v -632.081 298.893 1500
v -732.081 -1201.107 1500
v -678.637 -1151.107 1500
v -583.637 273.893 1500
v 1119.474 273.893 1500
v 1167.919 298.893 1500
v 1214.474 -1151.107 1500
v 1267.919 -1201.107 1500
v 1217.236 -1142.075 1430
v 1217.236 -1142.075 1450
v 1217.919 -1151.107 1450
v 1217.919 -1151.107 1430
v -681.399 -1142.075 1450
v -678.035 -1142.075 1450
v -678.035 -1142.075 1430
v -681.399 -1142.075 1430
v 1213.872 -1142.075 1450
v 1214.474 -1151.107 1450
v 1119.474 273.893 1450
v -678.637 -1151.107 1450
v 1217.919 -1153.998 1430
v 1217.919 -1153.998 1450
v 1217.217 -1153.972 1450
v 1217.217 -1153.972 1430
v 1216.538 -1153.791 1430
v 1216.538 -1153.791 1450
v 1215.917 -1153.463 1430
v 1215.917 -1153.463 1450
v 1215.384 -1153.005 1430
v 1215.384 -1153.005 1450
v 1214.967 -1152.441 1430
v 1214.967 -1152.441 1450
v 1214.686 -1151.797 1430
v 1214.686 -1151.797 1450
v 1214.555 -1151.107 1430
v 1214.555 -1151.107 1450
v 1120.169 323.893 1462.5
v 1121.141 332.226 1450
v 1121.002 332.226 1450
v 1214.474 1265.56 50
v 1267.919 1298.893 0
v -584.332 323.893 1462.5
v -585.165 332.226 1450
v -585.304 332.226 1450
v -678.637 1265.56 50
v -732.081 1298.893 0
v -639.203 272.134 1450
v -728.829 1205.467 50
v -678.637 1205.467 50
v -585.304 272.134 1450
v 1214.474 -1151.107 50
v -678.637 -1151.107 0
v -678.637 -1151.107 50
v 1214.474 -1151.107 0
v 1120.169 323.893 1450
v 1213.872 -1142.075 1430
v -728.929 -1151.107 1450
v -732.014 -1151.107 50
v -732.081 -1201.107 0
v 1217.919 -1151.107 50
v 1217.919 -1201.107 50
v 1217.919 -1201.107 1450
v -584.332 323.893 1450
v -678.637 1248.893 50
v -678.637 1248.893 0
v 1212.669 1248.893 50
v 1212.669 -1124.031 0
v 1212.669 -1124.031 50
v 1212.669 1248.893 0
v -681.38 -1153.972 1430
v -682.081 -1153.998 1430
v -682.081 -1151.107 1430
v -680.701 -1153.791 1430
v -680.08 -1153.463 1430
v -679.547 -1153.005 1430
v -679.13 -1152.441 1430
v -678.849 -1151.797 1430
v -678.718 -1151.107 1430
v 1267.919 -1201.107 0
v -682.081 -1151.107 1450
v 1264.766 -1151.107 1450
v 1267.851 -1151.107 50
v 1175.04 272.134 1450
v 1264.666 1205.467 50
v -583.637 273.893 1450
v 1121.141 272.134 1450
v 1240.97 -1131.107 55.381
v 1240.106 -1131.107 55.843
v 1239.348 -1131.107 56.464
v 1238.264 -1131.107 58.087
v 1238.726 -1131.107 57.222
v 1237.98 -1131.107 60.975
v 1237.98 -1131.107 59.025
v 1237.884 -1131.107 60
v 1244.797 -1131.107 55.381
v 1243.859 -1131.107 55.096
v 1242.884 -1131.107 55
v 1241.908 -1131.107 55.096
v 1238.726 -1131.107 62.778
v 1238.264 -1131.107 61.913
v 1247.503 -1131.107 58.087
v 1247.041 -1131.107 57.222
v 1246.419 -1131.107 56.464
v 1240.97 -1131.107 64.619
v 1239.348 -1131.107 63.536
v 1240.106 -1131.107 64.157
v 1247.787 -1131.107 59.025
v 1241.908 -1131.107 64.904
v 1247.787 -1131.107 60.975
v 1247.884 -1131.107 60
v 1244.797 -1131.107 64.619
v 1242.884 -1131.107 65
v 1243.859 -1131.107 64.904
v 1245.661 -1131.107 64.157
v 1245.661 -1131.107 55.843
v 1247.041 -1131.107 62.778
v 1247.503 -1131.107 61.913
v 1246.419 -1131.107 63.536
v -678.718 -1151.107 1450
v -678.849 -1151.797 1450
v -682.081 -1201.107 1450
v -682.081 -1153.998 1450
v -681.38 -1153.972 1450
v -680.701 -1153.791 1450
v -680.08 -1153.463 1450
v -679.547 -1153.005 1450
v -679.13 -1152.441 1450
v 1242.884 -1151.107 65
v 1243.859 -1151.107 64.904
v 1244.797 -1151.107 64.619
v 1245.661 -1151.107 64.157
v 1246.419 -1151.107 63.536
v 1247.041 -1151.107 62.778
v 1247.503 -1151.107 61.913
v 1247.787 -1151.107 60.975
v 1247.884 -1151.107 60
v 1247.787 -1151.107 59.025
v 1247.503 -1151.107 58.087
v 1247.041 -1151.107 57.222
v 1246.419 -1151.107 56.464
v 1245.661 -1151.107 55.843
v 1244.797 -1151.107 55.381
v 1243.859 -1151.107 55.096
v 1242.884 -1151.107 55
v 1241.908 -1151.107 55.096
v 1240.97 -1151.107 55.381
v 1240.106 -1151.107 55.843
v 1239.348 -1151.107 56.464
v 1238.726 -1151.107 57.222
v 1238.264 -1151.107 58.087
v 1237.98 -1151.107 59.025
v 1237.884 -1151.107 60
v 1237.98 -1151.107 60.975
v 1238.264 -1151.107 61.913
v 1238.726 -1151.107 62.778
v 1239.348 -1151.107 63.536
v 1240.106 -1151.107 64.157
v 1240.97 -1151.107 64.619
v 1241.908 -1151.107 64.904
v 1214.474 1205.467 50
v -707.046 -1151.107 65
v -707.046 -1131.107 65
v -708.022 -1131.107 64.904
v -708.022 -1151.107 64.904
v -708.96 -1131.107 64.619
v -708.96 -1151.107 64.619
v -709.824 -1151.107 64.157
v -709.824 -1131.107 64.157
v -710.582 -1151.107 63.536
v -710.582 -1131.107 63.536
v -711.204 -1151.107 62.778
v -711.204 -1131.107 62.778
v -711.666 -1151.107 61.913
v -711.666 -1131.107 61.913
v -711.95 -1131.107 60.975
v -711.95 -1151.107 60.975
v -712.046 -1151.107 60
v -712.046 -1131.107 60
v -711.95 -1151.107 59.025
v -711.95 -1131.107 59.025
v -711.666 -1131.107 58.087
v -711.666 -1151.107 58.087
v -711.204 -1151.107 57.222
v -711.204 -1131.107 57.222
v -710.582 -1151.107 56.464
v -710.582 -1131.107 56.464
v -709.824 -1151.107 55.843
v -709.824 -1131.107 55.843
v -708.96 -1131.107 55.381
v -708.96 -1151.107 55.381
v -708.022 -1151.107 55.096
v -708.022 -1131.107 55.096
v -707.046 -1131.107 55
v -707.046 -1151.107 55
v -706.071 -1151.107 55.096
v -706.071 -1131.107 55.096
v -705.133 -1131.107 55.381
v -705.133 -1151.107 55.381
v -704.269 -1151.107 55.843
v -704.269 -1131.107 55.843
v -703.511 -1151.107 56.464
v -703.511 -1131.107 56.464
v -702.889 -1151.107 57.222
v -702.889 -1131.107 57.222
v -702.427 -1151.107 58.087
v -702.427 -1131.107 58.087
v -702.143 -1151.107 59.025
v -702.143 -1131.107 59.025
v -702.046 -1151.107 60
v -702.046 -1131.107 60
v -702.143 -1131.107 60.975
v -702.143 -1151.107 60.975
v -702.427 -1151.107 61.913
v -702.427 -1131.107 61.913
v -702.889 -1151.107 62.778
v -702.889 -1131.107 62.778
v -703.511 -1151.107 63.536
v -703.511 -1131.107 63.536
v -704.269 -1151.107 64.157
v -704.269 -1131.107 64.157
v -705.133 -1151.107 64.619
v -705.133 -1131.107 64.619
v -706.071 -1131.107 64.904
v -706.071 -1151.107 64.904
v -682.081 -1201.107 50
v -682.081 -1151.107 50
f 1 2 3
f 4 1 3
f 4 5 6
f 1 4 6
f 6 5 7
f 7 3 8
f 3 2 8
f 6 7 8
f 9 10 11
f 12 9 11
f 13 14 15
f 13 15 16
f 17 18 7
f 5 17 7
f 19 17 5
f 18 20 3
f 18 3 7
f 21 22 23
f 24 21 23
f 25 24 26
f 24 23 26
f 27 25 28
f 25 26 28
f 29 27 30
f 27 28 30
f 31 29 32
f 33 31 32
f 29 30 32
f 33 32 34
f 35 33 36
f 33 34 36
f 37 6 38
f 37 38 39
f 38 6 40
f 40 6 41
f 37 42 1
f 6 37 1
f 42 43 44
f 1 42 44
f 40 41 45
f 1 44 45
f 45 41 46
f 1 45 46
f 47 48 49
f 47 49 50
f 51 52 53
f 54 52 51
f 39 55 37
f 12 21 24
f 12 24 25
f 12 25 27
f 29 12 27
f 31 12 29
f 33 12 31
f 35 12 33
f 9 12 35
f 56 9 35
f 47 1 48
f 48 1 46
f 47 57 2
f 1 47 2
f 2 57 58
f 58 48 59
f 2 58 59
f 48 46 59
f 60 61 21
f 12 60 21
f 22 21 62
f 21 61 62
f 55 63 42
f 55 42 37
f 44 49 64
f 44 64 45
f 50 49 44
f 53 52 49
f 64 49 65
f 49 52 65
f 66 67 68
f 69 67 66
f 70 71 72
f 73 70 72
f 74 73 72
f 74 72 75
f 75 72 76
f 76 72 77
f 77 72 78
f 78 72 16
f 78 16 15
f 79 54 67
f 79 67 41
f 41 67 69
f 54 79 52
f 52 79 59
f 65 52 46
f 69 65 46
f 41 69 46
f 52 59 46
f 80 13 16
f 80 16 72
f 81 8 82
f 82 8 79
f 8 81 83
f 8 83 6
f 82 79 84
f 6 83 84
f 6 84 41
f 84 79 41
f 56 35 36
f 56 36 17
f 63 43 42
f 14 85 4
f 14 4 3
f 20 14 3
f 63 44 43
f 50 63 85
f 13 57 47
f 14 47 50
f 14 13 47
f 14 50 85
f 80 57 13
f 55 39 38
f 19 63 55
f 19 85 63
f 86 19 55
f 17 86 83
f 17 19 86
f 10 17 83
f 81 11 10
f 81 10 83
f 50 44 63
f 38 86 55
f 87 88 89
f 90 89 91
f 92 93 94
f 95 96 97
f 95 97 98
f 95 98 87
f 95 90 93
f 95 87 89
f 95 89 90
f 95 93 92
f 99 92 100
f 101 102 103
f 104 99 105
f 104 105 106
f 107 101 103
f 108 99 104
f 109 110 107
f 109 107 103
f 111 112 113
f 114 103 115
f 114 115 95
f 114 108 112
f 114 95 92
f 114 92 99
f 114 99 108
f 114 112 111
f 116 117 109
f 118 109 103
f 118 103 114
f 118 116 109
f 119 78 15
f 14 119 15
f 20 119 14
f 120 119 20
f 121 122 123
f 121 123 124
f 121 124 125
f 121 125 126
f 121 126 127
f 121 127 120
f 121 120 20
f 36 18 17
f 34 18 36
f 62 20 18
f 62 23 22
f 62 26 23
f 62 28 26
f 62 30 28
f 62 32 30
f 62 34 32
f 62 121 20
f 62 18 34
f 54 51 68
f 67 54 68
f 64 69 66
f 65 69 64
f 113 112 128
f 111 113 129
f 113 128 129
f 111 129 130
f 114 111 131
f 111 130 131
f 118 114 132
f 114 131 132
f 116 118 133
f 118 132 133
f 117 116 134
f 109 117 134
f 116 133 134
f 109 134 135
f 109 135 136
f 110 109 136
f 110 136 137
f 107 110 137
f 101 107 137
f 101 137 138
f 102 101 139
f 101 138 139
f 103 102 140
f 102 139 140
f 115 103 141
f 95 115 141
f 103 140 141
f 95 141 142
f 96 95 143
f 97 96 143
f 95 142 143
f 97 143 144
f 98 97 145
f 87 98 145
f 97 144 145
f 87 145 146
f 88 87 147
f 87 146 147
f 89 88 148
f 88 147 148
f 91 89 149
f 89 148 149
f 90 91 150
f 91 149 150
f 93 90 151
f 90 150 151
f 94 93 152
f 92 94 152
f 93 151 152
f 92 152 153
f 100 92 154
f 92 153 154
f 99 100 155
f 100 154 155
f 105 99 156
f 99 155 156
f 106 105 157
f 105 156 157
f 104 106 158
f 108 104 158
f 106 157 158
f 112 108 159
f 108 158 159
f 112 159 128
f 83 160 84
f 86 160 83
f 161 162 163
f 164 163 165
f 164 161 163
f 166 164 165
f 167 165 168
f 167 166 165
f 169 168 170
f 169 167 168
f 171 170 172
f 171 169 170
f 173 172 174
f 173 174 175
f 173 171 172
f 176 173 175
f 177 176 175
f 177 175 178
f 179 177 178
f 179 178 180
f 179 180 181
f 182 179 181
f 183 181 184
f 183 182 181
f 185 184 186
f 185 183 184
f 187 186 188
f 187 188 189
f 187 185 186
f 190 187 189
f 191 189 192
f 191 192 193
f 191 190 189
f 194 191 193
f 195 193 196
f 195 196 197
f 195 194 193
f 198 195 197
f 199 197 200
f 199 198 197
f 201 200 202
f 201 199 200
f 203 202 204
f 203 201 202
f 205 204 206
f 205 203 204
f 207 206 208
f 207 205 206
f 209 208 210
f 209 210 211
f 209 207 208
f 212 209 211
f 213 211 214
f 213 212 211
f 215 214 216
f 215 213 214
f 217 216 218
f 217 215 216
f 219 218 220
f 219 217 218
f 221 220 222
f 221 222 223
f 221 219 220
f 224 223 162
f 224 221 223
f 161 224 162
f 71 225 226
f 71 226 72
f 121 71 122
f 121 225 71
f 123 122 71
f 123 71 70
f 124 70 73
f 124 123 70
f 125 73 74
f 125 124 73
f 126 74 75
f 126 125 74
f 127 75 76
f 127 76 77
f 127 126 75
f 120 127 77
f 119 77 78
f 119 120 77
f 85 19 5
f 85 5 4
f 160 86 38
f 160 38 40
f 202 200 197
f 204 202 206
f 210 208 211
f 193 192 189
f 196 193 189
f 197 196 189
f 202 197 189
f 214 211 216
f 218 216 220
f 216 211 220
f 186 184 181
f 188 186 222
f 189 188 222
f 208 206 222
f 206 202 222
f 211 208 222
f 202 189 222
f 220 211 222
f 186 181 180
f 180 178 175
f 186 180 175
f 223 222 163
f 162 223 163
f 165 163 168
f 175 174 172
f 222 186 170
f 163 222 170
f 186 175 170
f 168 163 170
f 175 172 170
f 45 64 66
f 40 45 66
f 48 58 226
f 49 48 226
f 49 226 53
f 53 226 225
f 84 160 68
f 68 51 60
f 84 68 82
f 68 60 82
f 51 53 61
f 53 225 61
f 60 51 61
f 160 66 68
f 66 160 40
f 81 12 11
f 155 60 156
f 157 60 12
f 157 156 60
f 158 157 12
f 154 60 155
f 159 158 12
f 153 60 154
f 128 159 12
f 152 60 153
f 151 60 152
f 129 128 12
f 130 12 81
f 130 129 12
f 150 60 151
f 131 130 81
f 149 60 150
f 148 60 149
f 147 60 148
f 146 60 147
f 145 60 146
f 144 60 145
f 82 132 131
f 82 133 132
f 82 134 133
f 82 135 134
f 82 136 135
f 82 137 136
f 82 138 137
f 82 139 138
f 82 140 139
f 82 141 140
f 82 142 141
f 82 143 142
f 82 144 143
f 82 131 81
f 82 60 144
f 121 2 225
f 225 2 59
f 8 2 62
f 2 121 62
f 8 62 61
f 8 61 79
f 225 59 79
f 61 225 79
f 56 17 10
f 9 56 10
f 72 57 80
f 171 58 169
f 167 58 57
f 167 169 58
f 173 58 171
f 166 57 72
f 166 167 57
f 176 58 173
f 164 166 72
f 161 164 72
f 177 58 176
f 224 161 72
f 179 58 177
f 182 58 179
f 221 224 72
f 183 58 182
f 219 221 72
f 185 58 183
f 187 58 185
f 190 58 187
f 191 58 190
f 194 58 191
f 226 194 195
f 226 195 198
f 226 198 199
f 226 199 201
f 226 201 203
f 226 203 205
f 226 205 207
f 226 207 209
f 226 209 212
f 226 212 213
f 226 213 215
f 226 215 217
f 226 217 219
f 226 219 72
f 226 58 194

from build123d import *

# Parameters (mm, degrees)
ENL_V_MAT_EXTRU_1_DEPTH      = 1873
ENL_V_MAT_EXTRU_1_DEPTH_BACK = 1210
ENL_V_MAT_EXTRU_2_DEPTH      = 2794
ESQUISSE5_W                  = 1891.306300633
ESQUISSE5_H                  = 2400
ENL_V_MAT_EXTRU_3_DEPTH      = 50
ESQUISSE7_W                  = 1900
ESQUISSE7_H                  = 1400
ENL_V_MAT_EXTRU_5_DEPTH      = 50
ENL_V_MAT_EXTRU_6_DEPTH      = 1354
ENL_V_MAT_EXTRU_6_DEPTH_BACK = 877
ESQUISSE10_R                 = 5
BOSS_EXTRU_1_DEPTH           = 20
BOSS_EXTRU_3_DEPTH           = 20


with BuildPart() as part:
    # Esquisse2 → Lissage1 section 0
    with BuildSketch(Plane.XY.offset(1500)):
        with BuildLine():
            Line((-732.081466601, -1201.10701107), (1267.918533399, -1201.10701107))
            Line((1267.918533399, -1201.10701107), (1167.918533399, 298.89298893))
            Line((1167.918533399, 298.89298893), (-632.081466601, 298.89298893))
            Line((-632.081466601, 298.89298893), (-732.081466601, -1201.10701107))
        make_face()
    # Esquisse1 → Lissage1 section 1
    with BuildSketch(Plane.XY):
        with BuildLine():
            Line((-732.081466601, 1298.89298893), (1267.918533399, 1298.89298893))
            Line((1267.918533399, 1298.89298893), (1267.918533399, -1201.10701107))
            Line((1267.918533399, -1201.10701107), (-732.081466601, -1201.10701107))
            Line((-732.081466601, -1201.10701107), (-732.081466601, 1298.89298893))
        make_face()
    loft()

    # Esquisse3 → Enlèv. mat.-Extru.1 (cut, two sides: drawn at the far end of the back side and taken through both)
    with BuildSketch(Plane(origin=(0, 0, 0), x_dir=(0, 0, -1), z_dir=(1, 0, 0)).offset(-ENL_V_MAT_EXTRU_1_DEPTH_BACK)):
        Polygon((-1450, -1151.10701107), (-50, -1151.10701107), (-50, 1205.467134339), (-1450, 272.133801005), align=None)
    extrude(amount=ENL_V_MAT_EXTRU_1_DEPTH + ENL_V_MAT_EXTRU_1_DEPTH_BACK, mode=Mode.SUBTRACT)

    # Esquisse4 → Enlèv. mat.-Extru.2 (cut)
    with BuildSketch(Plane.XY):
        Polygon((-583.637145339, 273.89298893), (-678.637145339, -1151.10701107), (1214.474212138, -1151.10701107), (1119.474212138, 273.89298893), align=None)
        Polygon((-676.832088495, 1248.89298893), (-584.332088495, 323.89298893), (1120.169155294, 323.89298893), (1212.669155294, 1248.89298893), align=None)
    extrude(amount=ENL_V_MAT_EXTRU_2_DEPTH, mode=Mode.SUBTRACT)

    # Esquisse5 → Enlèv. mat.-Extru.3 (cut)
    with BuildSketch(Plane(origin=(0, 0, 0), x_dir=(-1, 0, 0), z_dir=(0, 0, -1))):
        with Locations((-267.016004978, 48.89298893)):
            Rectangle(ESQUISSE5_W, ESQUISSE5_H)
    extrude(amount=-ENL_V_MAT_EXTRU_3_DEPTH, mode=Mode.SUBTRACT)

    # Esquisse7 → Enlèv. mat.-Extru.5 (cut)
    with BuildSketch(Plane.XZ.offset(1201.10701107)):
        with Locations((267.918533399, 750)):
            Rectangle(ESQUISSE7_W, ESQUISSE7_H)
    extrude(amount=-ENL_V_MAT_EXTRU_5_DEPTH, mode=Mode.SUBTRACT)

    # Esquisse6 → Enlèv. mat.-Extru.6 (cut, two sides: drawn at the far end of the back side and taken through both)
    with BuildSketch(Plane(origin=(0, 323.89298893, 0), x_dir=(1, 0, 0), z_dir=(0, 1, 0)).offset(-ENL_V_MAT_EXTRU_6_DEPTH_BACK)):
        Polygon((-678.637145339, -50), (-585.303812006, -1450), (1121.140878805, -1450), (1214.474212138, -50), align=None)
    extrude(amount=ENL_V_MAT_EXTRU_6_DEPTH + ENL_V_MAT_EXTRU_6_DEPTH_BACK, mode=Mode.SUBTRACT)

    # Esquisse10 → Boss.-Extru.1 (add)
    with BuildSketch(Plane(origin=(0, -1151.10701107, 0), x_dir=(1, 0, 0), z_dir=(0, 1, 0))):
        with Locations(Location((1242.883533399, -60, 0), (0, 0, 270))):
            Circle(ESQUISSE10_R)
    boss_extru_1 = extrude(amount=BOSS_EXTRU_1_DEPTH)

    # Esquisse11 → Boss.-Extru.3 (add)
    with BuildSketch(Plane(origin=(0, 0, 1450), x_dir=(-1, 0, 0), z_dir=(0, 0, -1))):
        with BuildLine():
            Line((-1214.554595697, -1151.10701107), (-1213.872047927, -1142.074547901))
            Line((-1213.872047927, -1142.074547901), (-1217.23598563, -1142.074547901))
            Line((-1217.23598563, -1142.074547901), (-1217.918533399, -1151.10701107))
            Line((-1217.918533399, -1151.10701107), (-1217.918533399, -1153.99826826))
            ThreePointArc((-1217.918533399, -1153.99826826), (-1215.637765578, -1153.249333975), (-1214.554595697, -1151.10701107))
        make_face()
    boss_extru_3 = extrude(amount=BOSS_EXTRU_3_DEPTH)

    # Symétrie1: Boss.-Extru.1, Boss.-Extru.3 across plane
    add(boss_extru_1.mirror(Plane(origin=(267.918533399, 0, 0), x_dir=(0, 0, 1), z_dir=(1, 0, 0))))
    add(boss_extru_3.mirror(Plane(origin=(267.918533399, 0, 0), x_dir=(0, 0, 1), z_dir=(1, 0, 0))))


solid = part.part
